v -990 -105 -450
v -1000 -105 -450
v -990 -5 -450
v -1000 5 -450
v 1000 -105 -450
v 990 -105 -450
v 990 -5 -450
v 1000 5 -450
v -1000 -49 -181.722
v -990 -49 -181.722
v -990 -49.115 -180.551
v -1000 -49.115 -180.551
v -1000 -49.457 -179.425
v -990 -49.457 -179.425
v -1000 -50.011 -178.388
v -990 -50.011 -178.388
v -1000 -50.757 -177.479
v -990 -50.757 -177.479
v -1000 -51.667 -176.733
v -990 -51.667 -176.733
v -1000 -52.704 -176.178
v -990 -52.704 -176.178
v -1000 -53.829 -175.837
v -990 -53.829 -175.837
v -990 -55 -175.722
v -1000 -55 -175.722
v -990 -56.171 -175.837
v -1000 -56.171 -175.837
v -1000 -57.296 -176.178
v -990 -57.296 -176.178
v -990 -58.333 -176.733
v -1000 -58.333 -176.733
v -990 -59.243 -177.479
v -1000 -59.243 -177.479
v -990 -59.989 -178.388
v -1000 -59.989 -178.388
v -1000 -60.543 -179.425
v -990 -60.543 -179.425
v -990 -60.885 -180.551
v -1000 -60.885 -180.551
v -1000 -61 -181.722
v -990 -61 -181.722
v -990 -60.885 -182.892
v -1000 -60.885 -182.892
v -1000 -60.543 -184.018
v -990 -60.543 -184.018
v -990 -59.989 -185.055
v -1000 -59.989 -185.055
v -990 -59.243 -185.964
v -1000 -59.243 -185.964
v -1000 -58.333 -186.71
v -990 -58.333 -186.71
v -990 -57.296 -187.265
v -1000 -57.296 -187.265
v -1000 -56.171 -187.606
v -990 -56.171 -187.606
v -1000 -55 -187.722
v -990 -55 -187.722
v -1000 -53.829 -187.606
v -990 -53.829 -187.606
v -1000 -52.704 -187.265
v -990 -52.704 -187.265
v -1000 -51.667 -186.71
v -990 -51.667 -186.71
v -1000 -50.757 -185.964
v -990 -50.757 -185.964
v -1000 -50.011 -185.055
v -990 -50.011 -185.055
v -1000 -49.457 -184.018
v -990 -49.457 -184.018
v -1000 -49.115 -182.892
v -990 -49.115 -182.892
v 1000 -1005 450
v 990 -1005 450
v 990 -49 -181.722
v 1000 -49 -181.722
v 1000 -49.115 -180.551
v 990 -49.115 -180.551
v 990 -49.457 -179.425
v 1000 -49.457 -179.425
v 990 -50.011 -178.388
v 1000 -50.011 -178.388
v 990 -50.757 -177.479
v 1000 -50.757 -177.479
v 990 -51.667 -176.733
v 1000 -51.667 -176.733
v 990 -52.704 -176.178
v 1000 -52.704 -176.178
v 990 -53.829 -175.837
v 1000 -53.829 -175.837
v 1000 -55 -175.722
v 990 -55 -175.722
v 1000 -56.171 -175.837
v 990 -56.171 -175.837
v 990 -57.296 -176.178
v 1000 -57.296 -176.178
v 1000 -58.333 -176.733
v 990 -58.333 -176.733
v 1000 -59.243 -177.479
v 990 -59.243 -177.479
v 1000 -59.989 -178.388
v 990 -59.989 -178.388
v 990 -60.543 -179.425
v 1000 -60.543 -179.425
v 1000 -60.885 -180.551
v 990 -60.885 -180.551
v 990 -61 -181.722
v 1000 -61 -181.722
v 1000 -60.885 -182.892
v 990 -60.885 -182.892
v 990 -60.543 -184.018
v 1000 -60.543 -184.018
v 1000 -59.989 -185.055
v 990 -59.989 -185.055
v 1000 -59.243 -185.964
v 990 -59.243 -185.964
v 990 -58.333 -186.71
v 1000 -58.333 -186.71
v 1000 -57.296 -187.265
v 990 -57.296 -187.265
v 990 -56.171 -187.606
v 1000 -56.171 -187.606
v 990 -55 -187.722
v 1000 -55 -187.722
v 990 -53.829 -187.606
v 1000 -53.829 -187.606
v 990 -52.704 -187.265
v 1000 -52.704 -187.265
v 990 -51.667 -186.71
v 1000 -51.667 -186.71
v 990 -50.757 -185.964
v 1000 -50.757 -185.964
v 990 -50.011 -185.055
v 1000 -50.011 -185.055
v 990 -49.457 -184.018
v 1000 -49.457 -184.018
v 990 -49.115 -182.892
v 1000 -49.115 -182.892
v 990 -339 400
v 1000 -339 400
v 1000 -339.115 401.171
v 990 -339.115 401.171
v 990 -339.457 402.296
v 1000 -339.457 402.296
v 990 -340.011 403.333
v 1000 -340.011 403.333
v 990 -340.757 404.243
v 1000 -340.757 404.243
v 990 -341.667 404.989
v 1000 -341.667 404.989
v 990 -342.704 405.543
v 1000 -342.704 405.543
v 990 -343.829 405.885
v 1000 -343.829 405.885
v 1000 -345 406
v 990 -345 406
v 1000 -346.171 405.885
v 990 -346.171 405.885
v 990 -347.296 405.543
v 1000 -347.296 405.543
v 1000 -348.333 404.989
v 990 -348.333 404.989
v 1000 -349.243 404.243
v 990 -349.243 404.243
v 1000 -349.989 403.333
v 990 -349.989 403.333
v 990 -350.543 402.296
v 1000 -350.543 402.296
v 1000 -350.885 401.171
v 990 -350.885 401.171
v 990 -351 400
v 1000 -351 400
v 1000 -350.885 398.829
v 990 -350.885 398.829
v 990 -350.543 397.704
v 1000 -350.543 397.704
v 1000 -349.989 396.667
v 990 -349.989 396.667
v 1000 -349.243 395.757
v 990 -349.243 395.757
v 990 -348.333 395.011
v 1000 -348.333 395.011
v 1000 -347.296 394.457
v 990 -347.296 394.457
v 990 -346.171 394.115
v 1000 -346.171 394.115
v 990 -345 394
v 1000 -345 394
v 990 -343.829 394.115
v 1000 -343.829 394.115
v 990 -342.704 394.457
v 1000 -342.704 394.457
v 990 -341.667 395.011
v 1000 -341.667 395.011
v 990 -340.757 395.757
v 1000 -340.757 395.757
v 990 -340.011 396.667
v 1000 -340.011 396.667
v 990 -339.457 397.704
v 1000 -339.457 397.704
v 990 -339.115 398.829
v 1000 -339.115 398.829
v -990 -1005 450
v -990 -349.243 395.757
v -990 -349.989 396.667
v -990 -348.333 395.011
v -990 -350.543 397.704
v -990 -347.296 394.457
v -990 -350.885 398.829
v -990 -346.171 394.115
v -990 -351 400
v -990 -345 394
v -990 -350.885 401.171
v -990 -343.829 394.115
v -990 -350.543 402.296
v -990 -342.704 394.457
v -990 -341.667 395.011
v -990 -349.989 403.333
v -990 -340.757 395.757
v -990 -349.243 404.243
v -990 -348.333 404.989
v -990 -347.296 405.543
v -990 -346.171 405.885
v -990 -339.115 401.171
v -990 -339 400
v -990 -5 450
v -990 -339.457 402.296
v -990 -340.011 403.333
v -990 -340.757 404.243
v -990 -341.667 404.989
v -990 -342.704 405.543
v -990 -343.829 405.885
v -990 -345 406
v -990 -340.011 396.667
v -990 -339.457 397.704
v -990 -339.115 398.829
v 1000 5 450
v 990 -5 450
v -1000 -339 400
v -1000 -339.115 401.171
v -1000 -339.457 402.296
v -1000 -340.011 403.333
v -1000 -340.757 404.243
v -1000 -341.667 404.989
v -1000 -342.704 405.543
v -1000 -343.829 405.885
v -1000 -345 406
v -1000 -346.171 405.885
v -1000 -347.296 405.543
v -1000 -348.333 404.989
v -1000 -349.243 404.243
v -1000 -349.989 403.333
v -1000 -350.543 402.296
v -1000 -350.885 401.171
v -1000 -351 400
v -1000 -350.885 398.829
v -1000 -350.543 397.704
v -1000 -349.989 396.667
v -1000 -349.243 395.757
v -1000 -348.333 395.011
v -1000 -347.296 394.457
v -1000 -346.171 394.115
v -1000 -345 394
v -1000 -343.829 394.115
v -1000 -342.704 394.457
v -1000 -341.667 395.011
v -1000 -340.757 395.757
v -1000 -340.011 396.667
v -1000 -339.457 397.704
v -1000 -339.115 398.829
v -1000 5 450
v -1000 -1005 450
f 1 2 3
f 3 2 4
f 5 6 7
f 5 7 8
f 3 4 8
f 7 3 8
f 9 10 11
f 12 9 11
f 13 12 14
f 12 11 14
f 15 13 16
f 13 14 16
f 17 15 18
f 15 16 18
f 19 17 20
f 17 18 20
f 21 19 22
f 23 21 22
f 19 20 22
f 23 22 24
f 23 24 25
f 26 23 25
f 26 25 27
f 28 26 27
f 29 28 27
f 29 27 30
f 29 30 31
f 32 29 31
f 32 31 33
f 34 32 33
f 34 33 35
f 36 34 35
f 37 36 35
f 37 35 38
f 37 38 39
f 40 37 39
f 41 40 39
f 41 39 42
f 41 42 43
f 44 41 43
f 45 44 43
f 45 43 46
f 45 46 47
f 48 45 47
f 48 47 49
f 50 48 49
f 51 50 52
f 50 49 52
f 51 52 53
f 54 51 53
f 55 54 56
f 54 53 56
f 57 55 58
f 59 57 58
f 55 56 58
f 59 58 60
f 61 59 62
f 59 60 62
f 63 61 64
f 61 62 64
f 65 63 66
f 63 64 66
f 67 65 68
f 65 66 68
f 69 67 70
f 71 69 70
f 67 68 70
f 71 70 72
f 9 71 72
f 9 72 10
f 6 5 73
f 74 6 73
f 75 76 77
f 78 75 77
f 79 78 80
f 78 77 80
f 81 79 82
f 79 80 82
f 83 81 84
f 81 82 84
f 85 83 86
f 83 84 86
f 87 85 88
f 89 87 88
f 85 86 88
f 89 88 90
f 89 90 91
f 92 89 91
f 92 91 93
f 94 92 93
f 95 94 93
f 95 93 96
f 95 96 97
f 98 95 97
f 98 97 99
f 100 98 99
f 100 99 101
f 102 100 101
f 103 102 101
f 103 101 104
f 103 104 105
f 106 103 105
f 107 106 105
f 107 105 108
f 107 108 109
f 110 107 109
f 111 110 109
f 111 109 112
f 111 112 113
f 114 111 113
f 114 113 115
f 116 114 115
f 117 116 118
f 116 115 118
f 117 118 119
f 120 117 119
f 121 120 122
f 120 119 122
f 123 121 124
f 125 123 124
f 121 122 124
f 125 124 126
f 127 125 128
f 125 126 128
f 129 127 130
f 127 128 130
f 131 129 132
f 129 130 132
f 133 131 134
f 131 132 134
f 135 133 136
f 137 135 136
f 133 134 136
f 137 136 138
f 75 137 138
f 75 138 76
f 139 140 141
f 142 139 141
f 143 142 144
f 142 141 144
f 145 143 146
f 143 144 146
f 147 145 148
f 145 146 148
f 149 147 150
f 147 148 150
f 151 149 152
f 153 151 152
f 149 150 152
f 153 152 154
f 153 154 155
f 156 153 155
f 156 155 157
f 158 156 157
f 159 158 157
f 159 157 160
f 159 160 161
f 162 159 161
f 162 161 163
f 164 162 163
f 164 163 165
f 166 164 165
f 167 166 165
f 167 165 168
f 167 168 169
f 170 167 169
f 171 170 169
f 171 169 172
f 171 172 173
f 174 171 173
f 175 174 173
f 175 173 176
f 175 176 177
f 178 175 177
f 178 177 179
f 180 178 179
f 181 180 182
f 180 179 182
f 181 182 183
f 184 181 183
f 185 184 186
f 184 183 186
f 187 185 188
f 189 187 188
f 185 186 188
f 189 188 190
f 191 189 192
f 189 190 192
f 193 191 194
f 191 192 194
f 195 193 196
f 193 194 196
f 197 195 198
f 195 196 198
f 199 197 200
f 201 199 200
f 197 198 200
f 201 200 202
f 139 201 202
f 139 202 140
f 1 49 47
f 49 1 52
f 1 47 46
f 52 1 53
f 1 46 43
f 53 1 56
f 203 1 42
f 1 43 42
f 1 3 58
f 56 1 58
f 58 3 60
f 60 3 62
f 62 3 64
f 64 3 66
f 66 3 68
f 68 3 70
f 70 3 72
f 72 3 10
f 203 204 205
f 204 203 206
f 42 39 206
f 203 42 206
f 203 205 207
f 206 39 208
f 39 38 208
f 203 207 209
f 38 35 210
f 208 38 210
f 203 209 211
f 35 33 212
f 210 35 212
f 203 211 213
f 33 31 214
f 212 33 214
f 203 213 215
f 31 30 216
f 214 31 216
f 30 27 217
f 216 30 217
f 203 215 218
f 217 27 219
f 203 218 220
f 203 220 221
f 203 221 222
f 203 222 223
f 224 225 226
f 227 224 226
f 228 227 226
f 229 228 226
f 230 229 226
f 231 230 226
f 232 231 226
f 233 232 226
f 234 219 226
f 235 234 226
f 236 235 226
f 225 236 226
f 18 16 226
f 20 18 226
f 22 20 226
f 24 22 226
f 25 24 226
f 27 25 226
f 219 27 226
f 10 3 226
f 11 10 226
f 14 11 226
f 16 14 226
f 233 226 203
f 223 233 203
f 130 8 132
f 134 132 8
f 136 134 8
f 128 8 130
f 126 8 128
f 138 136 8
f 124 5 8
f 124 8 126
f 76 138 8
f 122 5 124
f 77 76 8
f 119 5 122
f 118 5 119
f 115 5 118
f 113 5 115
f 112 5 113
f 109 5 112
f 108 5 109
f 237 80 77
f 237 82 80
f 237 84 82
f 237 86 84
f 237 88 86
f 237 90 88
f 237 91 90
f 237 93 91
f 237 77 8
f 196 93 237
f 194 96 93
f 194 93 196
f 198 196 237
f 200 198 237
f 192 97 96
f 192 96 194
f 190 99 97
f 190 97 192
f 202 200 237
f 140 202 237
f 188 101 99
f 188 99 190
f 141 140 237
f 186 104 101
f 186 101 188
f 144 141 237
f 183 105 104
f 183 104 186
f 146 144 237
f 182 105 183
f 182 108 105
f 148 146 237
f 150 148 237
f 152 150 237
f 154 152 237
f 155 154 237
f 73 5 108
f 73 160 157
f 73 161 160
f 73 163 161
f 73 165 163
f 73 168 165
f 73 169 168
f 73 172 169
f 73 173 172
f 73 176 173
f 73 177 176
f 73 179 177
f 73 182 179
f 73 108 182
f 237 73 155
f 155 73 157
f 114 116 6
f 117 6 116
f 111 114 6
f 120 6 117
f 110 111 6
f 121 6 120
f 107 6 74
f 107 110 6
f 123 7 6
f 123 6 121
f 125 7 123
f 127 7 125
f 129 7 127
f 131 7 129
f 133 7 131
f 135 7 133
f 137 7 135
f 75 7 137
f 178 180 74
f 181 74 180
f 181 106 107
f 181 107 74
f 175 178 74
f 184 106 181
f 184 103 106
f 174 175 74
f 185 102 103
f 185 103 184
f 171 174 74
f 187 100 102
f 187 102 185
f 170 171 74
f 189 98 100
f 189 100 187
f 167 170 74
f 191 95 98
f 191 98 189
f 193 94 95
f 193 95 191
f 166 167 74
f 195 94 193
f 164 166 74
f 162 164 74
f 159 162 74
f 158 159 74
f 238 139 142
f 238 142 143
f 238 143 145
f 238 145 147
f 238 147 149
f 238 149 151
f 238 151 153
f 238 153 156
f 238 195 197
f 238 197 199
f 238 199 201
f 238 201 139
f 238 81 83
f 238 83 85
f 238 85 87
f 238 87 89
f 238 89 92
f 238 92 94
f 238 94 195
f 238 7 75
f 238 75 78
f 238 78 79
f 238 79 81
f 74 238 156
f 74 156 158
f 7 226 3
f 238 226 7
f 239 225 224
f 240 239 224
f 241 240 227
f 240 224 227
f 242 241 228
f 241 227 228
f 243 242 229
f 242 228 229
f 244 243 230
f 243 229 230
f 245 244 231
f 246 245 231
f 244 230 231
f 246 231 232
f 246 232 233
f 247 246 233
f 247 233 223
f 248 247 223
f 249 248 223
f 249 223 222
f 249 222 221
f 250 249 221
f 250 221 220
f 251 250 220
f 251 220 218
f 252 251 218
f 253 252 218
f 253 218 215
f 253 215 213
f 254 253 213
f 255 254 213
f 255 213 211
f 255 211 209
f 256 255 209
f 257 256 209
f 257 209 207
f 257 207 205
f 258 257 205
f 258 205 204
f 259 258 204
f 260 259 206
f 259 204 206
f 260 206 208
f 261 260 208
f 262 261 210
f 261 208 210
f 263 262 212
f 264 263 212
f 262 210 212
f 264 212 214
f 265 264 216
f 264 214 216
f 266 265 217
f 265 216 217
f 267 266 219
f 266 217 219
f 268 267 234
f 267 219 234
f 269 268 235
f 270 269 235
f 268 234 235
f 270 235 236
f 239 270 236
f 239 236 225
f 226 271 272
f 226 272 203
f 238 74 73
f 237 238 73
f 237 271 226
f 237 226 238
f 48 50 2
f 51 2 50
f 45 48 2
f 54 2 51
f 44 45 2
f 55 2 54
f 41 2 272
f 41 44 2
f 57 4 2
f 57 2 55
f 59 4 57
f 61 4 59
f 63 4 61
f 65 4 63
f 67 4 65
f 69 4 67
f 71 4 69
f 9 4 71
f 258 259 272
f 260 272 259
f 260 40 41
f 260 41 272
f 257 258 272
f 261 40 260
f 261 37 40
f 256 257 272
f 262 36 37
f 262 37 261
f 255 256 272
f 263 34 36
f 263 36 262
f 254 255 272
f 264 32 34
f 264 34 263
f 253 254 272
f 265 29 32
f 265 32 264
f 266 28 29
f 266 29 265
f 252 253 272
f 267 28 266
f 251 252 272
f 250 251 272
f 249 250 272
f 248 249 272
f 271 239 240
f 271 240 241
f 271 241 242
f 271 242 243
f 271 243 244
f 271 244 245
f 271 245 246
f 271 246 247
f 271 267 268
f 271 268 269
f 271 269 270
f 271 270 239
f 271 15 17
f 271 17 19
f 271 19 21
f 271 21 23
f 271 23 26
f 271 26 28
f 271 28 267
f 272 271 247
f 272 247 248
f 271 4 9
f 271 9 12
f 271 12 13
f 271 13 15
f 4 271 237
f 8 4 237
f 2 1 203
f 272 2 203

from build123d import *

# Parameters (mm, degrees)
F0_W     = 2000
F0_H     = 900
F1_DEPTH = 5
F2_W     = 10
F2_H     = 900
F3_DEPTH = 1000
F5_DEPTH = 2000.001
F7_D     = 12


with BuildPart() as f1:
    # F0 (on Front) → F1 (new body, symmetric)
    with BuildSketch(Plane.XZ):
        Rectangle(F0_W, F0_H)
    extrude(amount=F1_DEPTH, both=True)

    # F2 (on face) → F3 (join)
    with BuildSketch(Plane.XZ.offset(5)):
        with Locations((-995, 0)):
            Rectangle(F2_W, F2_H)
        with Locations((995, 0)):
            Rectangle(F2_W, F2_H)
    extrude(amount=F3_DEPTH)

    # F4 (on face) → F5 (cut, through all)
    with BuildSketch(Plane.YZ.offset(1000)):
        Polygon((-105, -450), (-1005, 450), (-1005, -450), align=None)
    extrude(amount=-F5_DEPTH, mode=Mode.SUBTRACT)

    # F7 (through all)
    with Locations(Plane(origin=(-1000, 0, 0), x_dir=(0, -1, 0), z_dir=(-1, 0, 0))):
        with Locations((345, 400), (55, -181.721583)):
            Hole(F7_D / 2)


solid = f1.part
